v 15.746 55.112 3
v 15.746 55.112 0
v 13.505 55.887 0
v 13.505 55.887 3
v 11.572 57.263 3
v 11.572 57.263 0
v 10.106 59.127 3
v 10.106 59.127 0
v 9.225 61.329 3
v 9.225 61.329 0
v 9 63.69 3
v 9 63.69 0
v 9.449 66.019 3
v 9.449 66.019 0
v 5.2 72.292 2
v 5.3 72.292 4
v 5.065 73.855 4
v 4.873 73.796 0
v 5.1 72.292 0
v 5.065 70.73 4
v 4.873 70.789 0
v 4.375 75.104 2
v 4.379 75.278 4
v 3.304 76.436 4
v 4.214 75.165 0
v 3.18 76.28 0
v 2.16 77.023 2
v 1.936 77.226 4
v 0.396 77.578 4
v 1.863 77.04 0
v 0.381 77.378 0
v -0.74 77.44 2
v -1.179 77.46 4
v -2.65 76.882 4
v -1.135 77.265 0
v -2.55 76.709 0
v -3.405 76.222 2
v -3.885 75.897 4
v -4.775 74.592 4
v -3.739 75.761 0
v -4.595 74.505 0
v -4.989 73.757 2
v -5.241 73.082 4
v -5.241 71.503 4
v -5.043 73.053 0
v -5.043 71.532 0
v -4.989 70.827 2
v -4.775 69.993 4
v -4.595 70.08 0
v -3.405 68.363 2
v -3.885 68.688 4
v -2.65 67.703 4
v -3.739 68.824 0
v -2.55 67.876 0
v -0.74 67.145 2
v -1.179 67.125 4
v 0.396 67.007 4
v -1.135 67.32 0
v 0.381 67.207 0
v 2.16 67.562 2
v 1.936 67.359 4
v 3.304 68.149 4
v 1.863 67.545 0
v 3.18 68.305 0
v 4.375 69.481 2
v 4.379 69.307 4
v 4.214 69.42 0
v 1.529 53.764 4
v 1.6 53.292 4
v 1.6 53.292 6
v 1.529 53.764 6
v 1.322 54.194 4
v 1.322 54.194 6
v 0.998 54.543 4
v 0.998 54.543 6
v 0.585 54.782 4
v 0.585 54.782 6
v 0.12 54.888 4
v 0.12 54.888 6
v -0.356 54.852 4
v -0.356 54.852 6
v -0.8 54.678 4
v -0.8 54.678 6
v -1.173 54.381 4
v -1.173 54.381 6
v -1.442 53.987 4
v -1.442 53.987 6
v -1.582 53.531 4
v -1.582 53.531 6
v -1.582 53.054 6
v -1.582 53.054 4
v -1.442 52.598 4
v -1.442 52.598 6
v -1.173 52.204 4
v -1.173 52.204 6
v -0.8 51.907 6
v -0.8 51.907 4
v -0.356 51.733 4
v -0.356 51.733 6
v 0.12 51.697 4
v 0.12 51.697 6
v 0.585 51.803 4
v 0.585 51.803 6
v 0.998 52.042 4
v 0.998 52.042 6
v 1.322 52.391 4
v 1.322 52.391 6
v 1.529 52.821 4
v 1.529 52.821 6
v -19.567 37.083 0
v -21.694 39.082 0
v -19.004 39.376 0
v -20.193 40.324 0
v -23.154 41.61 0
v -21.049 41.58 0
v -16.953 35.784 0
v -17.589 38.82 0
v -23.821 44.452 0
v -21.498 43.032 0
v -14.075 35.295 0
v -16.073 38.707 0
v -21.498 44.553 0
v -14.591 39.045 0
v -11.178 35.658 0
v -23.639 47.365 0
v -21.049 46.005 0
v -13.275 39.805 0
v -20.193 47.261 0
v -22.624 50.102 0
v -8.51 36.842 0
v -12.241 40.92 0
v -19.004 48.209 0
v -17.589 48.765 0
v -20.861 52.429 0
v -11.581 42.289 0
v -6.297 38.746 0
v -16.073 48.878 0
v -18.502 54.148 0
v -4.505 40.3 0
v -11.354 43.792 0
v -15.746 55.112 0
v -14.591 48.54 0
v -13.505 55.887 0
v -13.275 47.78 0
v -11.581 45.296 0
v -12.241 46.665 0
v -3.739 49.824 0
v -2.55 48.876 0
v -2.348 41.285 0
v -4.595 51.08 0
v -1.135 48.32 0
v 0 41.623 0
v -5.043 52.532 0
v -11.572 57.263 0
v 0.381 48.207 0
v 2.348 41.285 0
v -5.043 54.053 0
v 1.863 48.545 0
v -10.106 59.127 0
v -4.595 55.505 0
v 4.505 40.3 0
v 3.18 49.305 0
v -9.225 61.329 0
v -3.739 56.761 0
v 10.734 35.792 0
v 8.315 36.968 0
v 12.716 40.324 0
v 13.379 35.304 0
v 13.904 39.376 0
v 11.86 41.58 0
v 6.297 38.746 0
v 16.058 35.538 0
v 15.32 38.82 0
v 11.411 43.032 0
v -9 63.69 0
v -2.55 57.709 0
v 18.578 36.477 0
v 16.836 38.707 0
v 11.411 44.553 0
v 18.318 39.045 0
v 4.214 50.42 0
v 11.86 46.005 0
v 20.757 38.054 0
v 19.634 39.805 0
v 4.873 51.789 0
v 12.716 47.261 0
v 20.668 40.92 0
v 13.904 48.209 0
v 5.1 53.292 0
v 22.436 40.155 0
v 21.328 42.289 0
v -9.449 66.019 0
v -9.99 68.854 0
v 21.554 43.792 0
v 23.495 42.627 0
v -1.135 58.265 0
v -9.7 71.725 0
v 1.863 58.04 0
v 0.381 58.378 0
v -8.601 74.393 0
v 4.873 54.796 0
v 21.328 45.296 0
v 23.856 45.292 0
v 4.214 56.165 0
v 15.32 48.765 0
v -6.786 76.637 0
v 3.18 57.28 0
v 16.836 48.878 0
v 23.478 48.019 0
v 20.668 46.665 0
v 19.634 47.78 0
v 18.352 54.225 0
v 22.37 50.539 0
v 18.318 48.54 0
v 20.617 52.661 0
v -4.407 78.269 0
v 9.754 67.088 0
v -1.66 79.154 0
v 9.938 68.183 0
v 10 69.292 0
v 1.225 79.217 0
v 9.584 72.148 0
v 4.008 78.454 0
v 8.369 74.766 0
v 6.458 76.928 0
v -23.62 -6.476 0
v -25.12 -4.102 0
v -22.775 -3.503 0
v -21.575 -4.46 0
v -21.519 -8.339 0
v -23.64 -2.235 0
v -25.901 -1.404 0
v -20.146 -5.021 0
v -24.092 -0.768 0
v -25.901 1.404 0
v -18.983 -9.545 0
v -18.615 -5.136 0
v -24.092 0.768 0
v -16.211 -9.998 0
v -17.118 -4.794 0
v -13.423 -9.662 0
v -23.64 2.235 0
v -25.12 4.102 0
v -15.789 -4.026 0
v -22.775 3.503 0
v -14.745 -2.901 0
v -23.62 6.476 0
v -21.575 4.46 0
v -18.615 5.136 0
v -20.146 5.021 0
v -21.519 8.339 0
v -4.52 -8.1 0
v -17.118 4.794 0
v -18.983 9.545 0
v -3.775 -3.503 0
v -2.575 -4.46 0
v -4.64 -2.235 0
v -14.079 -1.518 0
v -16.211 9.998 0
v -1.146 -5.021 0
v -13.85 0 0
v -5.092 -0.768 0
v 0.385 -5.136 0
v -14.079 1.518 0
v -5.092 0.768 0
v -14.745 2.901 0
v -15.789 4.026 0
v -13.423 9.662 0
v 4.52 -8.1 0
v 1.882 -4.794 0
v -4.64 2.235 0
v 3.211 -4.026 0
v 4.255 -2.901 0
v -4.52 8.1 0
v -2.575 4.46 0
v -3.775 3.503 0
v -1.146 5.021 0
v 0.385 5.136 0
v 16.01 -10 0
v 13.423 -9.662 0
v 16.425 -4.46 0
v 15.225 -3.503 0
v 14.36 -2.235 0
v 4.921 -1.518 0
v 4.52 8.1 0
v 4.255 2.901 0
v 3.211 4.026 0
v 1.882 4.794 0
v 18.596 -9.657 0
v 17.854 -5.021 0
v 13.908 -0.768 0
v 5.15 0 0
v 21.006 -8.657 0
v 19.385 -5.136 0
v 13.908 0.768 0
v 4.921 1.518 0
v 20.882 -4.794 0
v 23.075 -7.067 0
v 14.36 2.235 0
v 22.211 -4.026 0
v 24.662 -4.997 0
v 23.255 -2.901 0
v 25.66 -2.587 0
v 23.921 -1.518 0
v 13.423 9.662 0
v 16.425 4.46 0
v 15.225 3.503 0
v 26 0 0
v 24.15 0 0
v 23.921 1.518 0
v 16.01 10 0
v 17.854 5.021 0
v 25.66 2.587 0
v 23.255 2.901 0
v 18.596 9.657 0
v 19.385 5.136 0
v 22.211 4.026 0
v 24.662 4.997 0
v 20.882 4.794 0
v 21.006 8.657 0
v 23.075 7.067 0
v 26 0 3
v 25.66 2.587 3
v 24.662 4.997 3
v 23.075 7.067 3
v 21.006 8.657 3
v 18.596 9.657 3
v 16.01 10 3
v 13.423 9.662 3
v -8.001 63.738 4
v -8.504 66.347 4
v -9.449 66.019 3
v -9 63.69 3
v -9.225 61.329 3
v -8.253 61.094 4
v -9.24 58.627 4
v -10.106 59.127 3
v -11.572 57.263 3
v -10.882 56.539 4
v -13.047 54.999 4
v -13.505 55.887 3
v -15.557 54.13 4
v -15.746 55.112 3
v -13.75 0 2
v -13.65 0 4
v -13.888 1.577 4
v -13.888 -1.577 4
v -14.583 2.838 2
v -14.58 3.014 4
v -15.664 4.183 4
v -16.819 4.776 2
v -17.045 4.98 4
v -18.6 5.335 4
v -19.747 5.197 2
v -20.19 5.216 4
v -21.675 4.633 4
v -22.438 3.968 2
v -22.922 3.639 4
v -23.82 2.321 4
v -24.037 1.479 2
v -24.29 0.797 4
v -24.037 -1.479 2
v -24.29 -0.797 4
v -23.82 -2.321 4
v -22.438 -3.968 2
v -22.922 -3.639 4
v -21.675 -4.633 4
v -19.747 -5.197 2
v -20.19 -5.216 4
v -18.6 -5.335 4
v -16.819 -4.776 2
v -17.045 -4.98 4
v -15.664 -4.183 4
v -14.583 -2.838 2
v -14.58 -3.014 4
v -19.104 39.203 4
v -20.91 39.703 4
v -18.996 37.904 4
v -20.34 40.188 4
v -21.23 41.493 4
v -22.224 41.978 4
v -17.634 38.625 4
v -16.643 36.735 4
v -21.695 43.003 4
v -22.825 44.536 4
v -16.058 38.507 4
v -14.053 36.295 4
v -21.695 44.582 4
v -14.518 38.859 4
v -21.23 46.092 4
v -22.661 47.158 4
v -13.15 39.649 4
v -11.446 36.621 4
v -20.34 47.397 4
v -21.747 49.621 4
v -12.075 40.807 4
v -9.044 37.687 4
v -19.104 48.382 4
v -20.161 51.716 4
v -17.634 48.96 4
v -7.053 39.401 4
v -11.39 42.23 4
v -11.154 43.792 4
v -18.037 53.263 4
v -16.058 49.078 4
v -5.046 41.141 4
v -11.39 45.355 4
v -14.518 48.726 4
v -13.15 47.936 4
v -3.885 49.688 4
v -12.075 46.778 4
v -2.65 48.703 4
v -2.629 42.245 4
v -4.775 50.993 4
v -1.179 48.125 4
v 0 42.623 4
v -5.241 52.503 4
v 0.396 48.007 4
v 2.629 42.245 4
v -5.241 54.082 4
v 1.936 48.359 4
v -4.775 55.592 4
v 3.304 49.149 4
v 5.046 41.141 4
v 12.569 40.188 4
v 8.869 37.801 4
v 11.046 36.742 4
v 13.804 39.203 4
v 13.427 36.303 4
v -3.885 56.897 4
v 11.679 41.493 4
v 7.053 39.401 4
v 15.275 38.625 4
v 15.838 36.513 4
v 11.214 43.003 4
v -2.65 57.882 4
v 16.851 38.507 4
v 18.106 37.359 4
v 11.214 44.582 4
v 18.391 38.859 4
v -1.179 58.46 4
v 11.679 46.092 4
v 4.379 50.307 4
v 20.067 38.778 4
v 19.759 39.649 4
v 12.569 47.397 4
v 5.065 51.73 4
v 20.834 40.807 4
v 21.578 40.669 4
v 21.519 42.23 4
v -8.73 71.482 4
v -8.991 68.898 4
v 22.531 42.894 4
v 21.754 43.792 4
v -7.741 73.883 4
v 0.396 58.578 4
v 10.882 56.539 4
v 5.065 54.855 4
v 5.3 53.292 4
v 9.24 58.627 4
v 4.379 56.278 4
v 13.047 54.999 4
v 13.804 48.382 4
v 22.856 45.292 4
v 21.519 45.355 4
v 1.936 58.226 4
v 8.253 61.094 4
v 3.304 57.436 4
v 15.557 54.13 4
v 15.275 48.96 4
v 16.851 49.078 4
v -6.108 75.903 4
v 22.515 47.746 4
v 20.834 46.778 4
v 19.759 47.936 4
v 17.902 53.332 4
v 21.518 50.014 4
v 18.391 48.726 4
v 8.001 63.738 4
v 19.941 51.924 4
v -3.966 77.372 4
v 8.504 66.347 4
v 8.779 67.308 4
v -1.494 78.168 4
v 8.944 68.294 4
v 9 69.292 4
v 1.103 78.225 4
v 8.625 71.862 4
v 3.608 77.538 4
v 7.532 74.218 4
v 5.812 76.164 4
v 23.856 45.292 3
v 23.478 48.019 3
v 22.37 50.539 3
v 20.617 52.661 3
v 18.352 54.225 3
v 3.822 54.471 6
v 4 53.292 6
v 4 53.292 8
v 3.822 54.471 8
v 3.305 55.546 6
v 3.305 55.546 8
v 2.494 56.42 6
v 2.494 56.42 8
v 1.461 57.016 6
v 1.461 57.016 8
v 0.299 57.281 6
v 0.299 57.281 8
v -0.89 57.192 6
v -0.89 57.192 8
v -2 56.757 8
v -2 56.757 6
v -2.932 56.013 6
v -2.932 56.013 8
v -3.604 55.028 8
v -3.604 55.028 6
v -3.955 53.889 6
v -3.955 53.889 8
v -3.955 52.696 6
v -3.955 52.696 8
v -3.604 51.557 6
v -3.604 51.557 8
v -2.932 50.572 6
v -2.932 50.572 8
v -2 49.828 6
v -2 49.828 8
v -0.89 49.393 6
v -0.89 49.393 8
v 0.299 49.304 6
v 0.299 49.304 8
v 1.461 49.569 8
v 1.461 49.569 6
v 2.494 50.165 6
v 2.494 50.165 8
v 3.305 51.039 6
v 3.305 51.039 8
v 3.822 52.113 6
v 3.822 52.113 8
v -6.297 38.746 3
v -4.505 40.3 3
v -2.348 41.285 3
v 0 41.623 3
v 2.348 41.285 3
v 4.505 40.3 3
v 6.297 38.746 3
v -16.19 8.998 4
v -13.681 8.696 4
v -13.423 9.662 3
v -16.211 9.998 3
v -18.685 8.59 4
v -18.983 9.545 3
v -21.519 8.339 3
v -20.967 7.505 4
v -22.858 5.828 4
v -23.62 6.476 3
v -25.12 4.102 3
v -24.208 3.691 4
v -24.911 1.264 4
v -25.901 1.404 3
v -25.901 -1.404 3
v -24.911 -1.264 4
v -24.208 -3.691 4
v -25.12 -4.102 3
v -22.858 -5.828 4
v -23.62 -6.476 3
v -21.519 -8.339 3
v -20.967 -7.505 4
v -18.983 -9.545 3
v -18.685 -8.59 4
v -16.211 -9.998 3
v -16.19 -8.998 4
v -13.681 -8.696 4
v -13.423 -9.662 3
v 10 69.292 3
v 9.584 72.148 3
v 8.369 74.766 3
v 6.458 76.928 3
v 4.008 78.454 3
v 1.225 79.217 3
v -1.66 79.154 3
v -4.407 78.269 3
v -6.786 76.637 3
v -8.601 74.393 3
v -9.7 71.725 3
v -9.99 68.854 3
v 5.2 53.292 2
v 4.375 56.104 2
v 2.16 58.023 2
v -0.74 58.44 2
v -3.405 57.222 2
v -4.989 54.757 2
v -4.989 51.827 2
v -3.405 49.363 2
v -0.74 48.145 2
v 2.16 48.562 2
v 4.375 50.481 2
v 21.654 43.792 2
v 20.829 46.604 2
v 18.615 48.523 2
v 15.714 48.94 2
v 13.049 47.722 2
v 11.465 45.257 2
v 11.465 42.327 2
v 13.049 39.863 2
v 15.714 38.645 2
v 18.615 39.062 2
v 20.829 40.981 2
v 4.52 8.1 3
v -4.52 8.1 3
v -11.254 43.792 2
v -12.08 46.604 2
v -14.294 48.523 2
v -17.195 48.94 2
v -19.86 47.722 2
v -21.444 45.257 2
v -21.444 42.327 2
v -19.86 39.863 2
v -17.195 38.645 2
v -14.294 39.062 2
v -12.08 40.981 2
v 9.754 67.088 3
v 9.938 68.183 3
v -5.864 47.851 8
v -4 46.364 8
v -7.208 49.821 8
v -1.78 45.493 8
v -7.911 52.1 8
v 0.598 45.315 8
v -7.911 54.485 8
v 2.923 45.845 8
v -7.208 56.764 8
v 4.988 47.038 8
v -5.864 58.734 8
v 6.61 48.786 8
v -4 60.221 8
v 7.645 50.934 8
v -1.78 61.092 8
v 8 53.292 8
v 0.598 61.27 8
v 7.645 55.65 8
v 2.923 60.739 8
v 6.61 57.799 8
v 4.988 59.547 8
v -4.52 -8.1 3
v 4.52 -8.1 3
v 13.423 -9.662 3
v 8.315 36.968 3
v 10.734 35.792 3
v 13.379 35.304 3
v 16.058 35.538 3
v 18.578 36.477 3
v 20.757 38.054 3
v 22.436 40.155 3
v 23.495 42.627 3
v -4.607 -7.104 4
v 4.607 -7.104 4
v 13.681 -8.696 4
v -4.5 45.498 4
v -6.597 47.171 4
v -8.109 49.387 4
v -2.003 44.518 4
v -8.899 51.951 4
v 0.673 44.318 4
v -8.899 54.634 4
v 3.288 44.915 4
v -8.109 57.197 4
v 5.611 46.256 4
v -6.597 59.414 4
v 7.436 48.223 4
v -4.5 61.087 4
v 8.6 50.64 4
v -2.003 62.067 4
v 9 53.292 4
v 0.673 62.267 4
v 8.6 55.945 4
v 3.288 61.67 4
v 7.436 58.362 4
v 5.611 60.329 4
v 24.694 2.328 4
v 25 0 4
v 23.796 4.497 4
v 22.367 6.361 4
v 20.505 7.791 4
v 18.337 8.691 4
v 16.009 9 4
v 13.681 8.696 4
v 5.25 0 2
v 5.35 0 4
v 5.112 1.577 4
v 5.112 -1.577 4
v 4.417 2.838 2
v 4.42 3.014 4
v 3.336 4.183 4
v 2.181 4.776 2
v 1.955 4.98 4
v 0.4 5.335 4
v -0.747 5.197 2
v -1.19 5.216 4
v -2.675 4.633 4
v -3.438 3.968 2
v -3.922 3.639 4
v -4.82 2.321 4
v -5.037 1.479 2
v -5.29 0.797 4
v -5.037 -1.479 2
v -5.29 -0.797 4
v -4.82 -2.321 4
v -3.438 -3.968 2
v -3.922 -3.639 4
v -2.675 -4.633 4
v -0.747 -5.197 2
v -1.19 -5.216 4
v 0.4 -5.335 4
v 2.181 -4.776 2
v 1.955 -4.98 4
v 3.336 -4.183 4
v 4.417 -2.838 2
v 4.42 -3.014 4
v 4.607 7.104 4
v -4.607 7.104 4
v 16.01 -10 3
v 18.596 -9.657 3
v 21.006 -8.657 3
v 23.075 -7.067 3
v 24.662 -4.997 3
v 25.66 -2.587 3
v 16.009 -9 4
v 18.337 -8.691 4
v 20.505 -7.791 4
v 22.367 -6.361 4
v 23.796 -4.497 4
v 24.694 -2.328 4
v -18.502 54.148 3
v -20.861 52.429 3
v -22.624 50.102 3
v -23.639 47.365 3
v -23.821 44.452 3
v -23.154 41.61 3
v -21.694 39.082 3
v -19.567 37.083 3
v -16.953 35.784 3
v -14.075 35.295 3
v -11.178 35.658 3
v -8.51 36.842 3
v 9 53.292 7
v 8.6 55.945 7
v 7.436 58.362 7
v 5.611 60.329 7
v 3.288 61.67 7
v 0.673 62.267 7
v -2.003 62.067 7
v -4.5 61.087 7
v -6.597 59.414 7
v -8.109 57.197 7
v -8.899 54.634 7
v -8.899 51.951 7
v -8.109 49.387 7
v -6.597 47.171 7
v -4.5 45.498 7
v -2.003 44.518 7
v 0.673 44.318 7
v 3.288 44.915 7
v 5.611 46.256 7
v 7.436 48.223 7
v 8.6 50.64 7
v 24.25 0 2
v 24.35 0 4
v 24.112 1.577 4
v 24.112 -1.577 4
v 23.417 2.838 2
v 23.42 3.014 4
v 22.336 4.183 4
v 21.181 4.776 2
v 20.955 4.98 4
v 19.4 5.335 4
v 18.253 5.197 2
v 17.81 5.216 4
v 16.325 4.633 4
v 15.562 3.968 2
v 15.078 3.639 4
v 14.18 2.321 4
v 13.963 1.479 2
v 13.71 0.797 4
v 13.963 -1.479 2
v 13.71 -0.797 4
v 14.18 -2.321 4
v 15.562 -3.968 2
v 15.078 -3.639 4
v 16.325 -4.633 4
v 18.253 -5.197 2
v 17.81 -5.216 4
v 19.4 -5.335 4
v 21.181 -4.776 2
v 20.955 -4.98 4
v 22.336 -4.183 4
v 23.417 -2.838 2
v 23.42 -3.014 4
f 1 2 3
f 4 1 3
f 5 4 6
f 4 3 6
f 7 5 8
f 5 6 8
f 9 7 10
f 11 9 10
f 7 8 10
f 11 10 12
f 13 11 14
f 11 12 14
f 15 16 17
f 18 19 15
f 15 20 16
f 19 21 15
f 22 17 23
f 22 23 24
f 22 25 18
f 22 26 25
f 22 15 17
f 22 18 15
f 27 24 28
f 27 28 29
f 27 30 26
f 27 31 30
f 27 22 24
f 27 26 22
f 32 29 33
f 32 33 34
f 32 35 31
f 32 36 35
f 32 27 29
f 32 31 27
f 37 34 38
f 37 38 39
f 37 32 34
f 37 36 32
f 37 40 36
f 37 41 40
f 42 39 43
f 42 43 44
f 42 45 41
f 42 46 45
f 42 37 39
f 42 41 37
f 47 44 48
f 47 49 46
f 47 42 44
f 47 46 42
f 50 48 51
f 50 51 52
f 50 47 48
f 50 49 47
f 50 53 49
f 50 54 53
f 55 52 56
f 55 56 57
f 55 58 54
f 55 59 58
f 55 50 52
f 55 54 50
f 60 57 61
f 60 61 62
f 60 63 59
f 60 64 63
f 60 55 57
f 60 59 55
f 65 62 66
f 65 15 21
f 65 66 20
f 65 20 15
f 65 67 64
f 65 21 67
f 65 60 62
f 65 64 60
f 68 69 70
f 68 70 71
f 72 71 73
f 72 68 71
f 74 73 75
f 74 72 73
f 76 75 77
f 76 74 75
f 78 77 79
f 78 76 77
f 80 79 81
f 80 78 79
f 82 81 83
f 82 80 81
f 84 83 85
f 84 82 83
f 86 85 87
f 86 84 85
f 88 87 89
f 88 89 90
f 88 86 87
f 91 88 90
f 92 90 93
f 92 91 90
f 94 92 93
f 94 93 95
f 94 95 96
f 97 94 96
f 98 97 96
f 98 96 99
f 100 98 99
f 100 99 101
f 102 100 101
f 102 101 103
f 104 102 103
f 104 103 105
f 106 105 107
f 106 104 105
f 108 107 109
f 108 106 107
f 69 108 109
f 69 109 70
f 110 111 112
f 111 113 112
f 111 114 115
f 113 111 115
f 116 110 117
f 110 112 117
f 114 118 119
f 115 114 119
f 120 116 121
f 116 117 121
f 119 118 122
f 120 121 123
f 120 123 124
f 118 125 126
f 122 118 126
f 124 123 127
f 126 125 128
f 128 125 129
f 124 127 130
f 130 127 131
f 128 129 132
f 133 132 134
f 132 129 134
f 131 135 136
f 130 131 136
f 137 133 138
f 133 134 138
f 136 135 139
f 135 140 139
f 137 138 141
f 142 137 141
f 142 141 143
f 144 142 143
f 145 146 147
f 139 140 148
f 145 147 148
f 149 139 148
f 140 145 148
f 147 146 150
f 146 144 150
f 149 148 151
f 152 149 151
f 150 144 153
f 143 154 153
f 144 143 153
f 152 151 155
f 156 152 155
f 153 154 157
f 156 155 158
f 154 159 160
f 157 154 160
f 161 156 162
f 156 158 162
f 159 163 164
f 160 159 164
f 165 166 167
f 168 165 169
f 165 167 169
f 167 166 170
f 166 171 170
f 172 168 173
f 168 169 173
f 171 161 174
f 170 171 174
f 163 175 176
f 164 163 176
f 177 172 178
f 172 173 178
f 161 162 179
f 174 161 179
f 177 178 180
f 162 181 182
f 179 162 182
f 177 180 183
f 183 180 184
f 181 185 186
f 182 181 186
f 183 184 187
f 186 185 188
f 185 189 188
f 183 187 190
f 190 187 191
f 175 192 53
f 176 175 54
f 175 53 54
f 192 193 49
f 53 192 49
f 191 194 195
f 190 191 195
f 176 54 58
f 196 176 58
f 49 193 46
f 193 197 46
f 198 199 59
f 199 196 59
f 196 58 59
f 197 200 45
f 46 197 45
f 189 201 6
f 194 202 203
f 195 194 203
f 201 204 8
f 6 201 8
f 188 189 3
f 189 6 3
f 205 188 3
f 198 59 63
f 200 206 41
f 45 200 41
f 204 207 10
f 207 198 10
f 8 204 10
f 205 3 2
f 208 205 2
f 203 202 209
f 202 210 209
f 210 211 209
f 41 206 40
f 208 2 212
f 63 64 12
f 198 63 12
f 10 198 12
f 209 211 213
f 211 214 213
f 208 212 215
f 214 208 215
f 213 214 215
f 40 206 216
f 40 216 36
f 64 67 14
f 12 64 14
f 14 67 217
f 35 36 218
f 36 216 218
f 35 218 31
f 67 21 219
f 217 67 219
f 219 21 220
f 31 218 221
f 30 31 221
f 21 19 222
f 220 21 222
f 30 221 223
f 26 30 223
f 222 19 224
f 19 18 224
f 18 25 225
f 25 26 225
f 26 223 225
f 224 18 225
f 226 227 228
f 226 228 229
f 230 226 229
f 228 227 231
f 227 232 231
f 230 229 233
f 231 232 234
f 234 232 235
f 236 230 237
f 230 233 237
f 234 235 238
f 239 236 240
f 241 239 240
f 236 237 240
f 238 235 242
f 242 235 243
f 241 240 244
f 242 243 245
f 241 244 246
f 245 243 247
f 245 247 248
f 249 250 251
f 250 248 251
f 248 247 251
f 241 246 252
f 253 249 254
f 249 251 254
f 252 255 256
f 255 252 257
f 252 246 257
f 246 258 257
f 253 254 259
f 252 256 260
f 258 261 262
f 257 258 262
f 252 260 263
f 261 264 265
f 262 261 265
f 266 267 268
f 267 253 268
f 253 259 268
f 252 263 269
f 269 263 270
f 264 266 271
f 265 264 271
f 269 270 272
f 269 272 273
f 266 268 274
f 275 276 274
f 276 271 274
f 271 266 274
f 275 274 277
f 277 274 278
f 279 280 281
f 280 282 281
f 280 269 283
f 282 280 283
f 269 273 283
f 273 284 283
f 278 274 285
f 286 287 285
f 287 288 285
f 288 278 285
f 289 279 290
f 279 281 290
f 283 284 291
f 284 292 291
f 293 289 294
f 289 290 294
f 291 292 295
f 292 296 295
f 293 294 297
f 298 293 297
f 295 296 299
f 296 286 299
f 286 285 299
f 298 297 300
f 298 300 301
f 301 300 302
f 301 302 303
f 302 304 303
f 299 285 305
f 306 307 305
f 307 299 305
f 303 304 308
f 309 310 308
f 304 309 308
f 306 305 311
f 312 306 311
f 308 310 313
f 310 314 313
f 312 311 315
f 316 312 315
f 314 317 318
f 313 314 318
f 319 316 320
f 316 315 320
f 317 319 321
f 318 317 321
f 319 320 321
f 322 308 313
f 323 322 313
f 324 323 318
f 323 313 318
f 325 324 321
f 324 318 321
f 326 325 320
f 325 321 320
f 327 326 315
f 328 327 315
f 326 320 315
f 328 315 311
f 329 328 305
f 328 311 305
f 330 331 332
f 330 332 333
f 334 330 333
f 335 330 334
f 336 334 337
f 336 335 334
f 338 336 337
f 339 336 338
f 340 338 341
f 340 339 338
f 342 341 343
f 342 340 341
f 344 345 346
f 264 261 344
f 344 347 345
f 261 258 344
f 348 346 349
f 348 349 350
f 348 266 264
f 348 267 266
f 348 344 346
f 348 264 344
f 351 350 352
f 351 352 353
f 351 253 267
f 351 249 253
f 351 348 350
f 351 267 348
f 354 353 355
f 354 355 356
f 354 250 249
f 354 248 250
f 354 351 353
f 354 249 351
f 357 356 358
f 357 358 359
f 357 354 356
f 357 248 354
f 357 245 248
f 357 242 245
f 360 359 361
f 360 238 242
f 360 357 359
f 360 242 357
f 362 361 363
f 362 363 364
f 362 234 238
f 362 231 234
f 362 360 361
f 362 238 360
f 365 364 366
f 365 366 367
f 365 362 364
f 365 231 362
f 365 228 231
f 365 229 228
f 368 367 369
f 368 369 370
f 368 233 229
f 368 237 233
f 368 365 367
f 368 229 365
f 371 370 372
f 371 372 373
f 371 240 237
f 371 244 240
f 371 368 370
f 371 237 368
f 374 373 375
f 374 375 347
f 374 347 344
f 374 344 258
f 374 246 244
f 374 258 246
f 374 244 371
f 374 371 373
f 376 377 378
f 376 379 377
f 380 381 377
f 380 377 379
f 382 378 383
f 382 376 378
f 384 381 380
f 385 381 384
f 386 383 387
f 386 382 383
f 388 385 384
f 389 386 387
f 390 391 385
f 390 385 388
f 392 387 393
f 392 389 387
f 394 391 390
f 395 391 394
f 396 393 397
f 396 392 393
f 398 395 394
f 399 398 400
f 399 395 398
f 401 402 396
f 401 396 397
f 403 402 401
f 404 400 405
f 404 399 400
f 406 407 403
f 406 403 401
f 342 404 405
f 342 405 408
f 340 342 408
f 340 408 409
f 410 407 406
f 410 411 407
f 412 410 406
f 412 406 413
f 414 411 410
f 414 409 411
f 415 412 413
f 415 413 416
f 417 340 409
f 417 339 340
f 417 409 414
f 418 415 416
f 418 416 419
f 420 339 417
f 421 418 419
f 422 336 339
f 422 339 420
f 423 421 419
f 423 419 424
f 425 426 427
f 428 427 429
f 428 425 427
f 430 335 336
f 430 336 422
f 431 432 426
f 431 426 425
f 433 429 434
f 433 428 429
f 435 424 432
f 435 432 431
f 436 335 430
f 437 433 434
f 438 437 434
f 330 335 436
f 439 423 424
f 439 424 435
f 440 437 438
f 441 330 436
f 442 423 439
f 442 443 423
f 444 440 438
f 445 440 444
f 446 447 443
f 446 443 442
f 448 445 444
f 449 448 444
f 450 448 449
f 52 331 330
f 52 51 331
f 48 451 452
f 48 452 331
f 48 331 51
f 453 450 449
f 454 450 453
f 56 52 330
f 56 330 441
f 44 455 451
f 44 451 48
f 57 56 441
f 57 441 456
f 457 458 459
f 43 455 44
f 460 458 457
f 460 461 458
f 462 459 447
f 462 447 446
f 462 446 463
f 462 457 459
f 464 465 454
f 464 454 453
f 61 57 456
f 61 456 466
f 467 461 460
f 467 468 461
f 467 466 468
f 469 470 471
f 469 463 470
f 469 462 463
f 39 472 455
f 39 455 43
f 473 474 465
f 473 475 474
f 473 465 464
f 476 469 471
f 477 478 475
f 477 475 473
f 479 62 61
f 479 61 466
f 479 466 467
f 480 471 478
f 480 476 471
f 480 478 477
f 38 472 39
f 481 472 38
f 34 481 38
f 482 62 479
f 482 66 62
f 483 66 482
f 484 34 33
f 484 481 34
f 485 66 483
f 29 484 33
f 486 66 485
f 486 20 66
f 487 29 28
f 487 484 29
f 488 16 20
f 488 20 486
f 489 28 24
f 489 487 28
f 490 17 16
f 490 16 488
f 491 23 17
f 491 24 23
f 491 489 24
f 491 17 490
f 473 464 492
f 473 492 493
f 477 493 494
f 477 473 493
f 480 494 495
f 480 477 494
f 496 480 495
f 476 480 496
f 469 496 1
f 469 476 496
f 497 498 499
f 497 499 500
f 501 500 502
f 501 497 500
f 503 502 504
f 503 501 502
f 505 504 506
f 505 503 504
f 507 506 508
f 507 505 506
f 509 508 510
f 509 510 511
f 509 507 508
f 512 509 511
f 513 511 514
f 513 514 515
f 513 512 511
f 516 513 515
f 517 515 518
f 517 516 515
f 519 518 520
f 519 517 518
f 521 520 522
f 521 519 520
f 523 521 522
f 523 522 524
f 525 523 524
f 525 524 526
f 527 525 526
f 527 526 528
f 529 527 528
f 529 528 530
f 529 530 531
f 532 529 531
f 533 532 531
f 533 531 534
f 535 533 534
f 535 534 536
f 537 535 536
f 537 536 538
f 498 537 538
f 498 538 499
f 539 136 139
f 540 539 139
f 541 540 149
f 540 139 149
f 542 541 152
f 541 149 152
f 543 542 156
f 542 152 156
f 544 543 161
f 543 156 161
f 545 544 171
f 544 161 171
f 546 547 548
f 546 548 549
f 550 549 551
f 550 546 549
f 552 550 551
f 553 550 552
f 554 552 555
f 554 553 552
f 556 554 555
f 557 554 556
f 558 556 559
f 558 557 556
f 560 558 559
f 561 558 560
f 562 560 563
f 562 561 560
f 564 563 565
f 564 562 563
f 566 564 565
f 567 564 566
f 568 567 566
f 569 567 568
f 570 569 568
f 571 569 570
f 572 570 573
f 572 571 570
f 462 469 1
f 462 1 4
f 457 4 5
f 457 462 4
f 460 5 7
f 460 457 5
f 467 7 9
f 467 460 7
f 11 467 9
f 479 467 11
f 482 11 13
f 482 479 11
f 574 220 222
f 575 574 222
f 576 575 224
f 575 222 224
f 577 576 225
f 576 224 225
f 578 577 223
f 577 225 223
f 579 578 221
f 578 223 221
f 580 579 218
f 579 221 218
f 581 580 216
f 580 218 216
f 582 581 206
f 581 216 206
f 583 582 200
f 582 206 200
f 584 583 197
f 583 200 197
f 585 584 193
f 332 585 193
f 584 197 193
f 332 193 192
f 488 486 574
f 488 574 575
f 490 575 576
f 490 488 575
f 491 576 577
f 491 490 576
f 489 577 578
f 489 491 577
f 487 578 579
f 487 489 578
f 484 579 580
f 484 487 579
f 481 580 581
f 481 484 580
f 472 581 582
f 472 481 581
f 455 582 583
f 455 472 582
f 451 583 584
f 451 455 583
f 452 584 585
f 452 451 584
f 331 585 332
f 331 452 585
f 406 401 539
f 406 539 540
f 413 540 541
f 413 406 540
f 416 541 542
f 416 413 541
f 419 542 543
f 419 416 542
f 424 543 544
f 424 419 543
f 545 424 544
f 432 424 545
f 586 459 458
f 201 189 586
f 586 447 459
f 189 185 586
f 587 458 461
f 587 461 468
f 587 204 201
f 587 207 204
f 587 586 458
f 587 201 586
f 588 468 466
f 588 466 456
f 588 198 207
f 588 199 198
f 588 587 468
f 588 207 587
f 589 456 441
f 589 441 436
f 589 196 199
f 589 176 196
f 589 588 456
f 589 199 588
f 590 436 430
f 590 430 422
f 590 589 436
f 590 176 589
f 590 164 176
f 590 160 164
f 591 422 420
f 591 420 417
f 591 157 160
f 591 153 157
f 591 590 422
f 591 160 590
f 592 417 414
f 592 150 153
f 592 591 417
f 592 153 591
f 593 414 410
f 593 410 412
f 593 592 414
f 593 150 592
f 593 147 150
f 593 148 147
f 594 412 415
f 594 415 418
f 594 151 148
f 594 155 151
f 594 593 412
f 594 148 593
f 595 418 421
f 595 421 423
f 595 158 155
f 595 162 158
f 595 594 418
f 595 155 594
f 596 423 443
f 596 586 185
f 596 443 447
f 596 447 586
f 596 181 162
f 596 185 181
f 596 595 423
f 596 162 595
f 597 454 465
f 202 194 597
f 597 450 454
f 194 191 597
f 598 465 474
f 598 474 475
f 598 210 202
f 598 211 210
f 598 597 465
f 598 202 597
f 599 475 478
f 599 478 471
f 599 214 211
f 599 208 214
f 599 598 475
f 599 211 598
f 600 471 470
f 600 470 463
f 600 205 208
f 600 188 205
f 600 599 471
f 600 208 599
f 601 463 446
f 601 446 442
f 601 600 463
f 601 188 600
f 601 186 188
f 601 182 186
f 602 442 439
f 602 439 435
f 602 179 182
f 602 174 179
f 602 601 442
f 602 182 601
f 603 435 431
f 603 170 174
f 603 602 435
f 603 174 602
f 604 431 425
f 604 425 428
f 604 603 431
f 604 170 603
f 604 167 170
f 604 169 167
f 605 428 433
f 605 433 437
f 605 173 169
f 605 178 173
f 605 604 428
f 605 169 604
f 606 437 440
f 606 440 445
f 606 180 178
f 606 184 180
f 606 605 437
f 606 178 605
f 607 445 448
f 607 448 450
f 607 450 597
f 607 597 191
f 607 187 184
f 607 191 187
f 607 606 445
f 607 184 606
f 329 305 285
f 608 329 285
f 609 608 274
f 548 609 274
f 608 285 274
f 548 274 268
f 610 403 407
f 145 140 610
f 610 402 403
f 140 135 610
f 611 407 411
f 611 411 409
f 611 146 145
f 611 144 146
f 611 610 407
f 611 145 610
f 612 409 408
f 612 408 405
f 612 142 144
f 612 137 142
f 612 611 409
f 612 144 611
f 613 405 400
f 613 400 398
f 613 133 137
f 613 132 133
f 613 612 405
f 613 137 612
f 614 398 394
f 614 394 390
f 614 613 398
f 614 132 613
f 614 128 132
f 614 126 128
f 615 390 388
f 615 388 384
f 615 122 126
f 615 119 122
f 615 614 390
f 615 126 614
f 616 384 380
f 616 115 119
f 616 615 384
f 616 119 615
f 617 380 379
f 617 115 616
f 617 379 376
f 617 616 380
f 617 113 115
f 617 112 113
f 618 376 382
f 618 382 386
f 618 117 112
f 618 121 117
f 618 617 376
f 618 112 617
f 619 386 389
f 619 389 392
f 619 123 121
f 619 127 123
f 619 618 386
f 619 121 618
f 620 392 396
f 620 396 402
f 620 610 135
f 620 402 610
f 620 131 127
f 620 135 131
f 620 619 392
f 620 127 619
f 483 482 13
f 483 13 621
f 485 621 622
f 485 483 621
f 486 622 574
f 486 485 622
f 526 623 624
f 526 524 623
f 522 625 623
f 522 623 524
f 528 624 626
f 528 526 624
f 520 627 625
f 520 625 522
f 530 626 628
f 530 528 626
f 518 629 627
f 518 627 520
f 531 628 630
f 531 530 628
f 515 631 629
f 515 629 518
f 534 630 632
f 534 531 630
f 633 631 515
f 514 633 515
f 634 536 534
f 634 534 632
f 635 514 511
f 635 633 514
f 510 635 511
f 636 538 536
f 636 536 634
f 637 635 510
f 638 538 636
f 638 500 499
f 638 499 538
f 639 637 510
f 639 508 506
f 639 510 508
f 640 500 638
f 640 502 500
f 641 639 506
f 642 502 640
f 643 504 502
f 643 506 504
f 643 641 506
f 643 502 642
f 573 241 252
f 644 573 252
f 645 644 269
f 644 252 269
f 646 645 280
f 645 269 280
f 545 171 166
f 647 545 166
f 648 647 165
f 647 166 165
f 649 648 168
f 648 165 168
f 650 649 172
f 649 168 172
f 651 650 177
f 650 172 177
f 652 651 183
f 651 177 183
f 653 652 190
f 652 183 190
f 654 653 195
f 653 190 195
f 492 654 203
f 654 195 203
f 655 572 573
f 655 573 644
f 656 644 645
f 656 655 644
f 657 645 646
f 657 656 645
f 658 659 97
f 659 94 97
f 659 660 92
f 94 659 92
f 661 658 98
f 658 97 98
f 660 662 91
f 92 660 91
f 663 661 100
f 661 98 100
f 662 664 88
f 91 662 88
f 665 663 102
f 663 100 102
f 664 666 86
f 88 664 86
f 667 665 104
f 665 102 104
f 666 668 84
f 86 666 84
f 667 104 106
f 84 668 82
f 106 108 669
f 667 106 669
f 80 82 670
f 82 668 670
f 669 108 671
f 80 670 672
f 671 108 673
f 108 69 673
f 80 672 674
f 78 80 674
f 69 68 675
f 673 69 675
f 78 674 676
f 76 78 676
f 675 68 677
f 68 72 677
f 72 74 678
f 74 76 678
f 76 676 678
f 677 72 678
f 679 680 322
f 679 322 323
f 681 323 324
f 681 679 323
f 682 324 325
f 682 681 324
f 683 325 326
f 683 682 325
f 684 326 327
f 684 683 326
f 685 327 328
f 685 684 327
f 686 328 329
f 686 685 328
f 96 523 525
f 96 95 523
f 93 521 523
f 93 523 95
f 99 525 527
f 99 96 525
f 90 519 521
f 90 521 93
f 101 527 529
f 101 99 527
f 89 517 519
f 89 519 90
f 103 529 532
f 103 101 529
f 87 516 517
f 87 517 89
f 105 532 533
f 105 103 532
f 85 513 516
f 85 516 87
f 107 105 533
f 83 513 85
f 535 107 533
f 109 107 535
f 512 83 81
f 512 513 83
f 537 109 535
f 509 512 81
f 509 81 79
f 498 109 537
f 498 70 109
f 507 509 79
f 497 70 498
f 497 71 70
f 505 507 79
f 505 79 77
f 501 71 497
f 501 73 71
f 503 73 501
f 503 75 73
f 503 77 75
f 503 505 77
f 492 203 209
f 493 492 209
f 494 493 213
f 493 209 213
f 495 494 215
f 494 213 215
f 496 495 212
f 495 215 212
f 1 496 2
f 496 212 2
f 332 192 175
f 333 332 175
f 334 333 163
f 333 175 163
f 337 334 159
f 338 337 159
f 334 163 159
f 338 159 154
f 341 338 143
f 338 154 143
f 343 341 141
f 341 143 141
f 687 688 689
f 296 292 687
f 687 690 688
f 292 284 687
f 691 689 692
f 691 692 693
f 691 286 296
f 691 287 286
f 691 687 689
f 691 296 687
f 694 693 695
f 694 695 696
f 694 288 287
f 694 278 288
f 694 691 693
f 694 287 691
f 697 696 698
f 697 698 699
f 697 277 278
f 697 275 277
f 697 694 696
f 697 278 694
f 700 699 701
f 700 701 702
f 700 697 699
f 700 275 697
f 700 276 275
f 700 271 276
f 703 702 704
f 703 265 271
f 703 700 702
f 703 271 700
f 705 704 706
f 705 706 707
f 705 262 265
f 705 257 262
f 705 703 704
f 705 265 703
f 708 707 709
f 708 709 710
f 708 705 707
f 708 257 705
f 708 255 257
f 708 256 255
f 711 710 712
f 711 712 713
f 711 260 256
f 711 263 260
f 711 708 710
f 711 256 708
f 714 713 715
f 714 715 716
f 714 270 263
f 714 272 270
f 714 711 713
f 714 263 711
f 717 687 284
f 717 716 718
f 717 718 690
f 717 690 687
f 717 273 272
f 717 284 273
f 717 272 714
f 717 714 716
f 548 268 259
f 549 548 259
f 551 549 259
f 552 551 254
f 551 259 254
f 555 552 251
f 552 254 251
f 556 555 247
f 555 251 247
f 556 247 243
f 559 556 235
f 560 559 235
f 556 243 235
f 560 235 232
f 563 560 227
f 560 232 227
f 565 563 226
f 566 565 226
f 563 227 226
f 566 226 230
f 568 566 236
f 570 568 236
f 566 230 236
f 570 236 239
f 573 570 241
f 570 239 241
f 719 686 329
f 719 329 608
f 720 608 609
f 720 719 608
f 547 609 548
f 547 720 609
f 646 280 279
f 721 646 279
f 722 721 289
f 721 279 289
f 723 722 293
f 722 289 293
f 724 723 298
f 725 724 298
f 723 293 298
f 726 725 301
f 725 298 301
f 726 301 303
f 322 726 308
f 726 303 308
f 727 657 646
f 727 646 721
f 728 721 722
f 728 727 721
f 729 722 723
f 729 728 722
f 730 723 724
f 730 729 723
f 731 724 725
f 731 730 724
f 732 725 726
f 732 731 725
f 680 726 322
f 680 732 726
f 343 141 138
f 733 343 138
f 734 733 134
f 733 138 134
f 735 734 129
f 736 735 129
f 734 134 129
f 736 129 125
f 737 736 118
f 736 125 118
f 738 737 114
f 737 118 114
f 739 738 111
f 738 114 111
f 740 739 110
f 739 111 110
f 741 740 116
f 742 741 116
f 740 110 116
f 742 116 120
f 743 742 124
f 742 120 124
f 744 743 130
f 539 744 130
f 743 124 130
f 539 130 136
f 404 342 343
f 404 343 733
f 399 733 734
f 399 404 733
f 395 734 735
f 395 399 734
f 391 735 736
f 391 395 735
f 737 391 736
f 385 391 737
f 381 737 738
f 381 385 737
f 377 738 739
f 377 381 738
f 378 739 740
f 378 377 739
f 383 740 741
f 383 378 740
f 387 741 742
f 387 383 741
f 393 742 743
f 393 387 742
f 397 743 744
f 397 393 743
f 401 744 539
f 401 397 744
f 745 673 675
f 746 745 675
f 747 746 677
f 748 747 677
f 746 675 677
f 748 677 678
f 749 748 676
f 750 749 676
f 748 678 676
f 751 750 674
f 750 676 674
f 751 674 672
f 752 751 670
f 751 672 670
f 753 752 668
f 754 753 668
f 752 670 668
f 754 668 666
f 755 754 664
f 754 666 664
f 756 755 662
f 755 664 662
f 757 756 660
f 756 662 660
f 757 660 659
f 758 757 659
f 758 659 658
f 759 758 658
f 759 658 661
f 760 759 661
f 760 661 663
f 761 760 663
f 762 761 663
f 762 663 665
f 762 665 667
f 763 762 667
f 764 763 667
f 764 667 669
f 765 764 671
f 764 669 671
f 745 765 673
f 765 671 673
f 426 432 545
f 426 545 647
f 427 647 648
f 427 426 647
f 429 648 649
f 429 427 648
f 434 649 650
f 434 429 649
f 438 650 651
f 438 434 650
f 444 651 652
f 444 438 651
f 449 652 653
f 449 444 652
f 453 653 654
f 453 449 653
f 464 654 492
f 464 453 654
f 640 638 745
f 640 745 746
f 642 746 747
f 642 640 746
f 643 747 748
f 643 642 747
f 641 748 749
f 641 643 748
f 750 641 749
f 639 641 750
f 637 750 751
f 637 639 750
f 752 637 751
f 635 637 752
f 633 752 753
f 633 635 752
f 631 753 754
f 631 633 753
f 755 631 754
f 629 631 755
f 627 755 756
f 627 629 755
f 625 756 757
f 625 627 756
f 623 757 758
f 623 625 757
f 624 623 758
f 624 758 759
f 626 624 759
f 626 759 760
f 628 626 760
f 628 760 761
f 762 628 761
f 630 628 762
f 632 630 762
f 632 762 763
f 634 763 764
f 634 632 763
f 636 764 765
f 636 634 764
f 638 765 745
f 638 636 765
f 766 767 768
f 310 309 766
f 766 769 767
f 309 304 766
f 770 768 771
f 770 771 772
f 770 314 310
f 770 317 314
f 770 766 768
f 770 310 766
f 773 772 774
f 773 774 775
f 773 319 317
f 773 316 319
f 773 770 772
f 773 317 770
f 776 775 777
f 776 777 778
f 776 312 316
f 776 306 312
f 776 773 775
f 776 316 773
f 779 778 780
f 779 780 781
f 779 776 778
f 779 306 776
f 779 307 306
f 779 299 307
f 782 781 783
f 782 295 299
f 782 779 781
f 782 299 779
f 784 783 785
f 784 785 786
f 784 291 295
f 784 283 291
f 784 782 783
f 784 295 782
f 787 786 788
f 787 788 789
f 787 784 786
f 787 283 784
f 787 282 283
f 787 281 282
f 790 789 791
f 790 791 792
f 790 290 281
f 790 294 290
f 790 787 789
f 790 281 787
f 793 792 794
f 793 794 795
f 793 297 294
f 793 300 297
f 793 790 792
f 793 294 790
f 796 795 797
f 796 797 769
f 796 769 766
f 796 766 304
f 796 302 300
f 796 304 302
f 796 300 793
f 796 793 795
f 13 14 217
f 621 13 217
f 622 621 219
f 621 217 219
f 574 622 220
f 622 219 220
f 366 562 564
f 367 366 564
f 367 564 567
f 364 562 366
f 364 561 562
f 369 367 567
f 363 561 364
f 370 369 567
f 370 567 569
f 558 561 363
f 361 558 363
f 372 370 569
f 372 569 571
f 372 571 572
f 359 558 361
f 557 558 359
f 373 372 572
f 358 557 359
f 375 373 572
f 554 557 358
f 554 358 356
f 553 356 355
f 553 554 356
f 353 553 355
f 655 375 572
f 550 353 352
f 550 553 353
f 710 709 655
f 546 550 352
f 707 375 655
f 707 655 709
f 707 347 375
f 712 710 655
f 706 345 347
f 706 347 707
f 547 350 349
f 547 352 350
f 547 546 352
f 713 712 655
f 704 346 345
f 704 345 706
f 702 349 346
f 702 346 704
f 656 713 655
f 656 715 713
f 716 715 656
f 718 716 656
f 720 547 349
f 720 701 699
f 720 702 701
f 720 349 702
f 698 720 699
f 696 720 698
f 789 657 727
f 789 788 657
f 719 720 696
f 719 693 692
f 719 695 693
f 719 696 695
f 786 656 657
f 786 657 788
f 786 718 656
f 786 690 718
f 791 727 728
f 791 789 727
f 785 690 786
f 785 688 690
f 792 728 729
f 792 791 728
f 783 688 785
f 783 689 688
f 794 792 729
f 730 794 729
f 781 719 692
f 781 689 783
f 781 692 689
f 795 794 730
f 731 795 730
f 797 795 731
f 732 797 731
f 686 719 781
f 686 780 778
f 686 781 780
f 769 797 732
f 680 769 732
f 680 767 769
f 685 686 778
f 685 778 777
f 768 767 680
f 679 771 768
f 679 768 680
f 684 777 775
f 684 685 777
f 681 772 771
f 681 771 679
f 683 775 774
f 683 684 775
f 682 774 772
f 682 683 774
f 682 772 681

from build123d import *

# Parameters (mm, degrees)
F0_R       = 5.15
F1_DEPTH   = 4
F2_SIZE    = 1
F3_R       = 5.1
F4_DEPTH   = 4
F5_SIZE    = 1
F6_SIZE2   = 3.99999
F6_SIZE    = 0.19999
F6_2_SIZE2 = 3.99999
F6_2_SIZE  = 0.19999
F7_R       = 9
F7_R_2     = 5.29999
F7_R_3     = 4
F8_DEPTH   = 4
F7_R_4     = 1.6
F9_DEPTH   = 2
F10_SIZE   = 1


# Not quite as in the source:
# - a fillet or chamfer is up to 0.001 mm smaller than in the source, because OpenCascade refuses the exact size
# - a feature names something its author has since deleted; it is built from what else it names


with BuildPart() as f1:
    # F0 (on Top) → F1 (new body)
    with BuildSketch(Plane.XY):
        with BuildLine():
            ThreePointArc((-13.4233737216, 9.6623494566), (-8.0701115145, 6.0923614968), (-6, 0))
            ThreePointArc((-6, 0), (-8.0701114601, -6.092361426), (-13.4233735489, -9.6623494106))
            ThreePointArc((-13.4233735489, -9.6623494106), (6.05e-08, -7.903301215), (13.4233736658, -9.6623494417))
            ThreePointArc((13.4233736658, -9.6623494417), (6, -6.16e-08), (13.4233735467, 9.66234941))
            ThreePointArc((13.4233735467, 9.66234941), (-9.05e-08, 7.903301215), (-13.4233737216, 9.6623494566))
        make_face()
        Circle(F0_R, mode=Mode.SUBTRACT)
        with BuildLine():
            ThreePointArc((-13.4233735489, -9.6623494106), (-8.0701114601, -6.092361426), (-6, 0))
            ThreePointArc((-6, 0), (-8.0701115145, 6.0923614968), (-13.4233737216, 9.6623494566))
            ThreePointArc((-13.4233737216, 9.6623494566), (-26, -8.94e-08), (-13.4233735489, -9.6623494106))
        make_face()
        with Locations((-19, 0)):
            Circle(F0_R, mode=Mode.SUBTRACT)
        with BuildLine():
            ThreePointArc((26, 0), (22.0923614251, 7.9298885406), (13.4233735467, 9.66234941))
            ThreePointArc((13.4233735467, 9.66234941), (6, -6.16e-08), (13.4233736658, -9.6623494417))
            ThreePointArc((13.4233736658, -9.6623494417), (22.0923614739, -7.929888503), (26, 0))
        make_face()
        with Locations((19, 0)):
            Circle(F0_R, mode=Mode.SUBTRACT)
    extrude(amount=F1_DEPTH)

    # F2
    f2_edges = [f1.edges().sort_by_distance(p)[0] for p in [
        (0, -7.903301, 4),
    ]]
    chamfer(f2_edges, length=F2_SIZE)

    # F6 (size 0.2 and 4 in the source; OpenCascade refuses exactly that, so slightly less here)
    f6_edges = [f1.edges().sort_by_distance(p)[0] for p in [
        (-24.15, 0, 4),
        (13.85, 0, 4),
        (-5.15, 0, 4),
    ]]
    f6_side = f1.faces().sort_by_distance((0, -6.371888, 4))[0]
    chamfer(f6_edges, length=F6_SIZE, length2=F6_SIZE2, reference=f6_side)


with BuildPart() as f4:
    # F3 (on Top) → F4 (new body)
    with BuildSketch(Plane.XY):
        with BuildLine():
            ThreePointArc((9.4491118238, 66.0191849315), (9.8613162975, 67.632802458), (10, 69.292453289))
            ThreePointArc((10, 69.292453289), (-1.6596509098, 79.1537695733), (-9.4491117716, 66.0191847805))
            ThreePointArc((-9.4491117716, 66.0191847805), (7.99e-08, 59.292453289), (9.4491118238, 66.0191849315))
        make_face()
        with Locations((0, 72.292453289)):
            Circle(F3_R, mode=Mode.SUBTRACT)
        with BuildLine():
            ThreePointArc((9.4491118238, 66.0191849315), (7.99e-08, 59.292453289), (-9.4491117716, 66.0191847805))
            ThreePointArc((-9.4491117716, 66.0191847805), (-10.1062544883, 59.1273014814), (-15.7462296119, 55.1122581983))
            ThreePointArc((-15.7462296119, 55.1122581983), (-7.4884488411, 53.0027785582), (-3.8564064606, 45.292453289))
            ThreePointArc((-3.8564064606, 45.292453289), (-4.4864305642, 41.7990950622), (-6.2971168007, 38.7459168125))
            ThreePointArc((-6.2971168007, 38.7459168125), (1.374e-07, 41.6227560689), (6.2971169806, 38.7459166047))
            ThreePointArc((6.2971169806, 38.7459166047), (5.1961526478, 50.2924536788), (15.74622968, 55.1122581852))
            ThreePointArc((15.74622968, 55.1122581852), (10.1062544657, 59.1273015205), (9.4491118238, 66.0191849315))
        make_face()
        with Locations((0, 53.292453289)):
            Circle(F3_R, mode=Mode.SUBTRACT)
        with BuildLine():
            ThreePointArc((23.8564064606, 45.292453289), (21.5667317518, 51.6604108818), (15.74622968, 55.1122581852))
            ThreePointArc((15.74622968, 55.1122581852), (5.1961526478, 50.2924536788), (6.2971169806, 38.7459166047))
            ThreePointArc((6.2971169806, 38.7459166047), (17.3497648161, 35.9224774406), (23.8564064606, 45.292453289))
        make_face()
        with Locations((16.4544826719, 43.792453289)):
            Circle(F3_R, mode=Mode.SUBTRACT)
        with BuildLine():
            ThreePointArc((-3.8564064606, 45.292453289), (-7.4884488411, 53.0027785582), (-15.7462296119, 55.1122581983))
            ThreePointArc((-15.7462296119, 55.1122581983), (-22.516660222, 40.2924528103), (-6.2971168007, 38.7459168125))
            ThreePointArc((-6.2971168007, 38.7459168125), (-4.4864305642, 41.7990950622), (-3.8564064606, 45.292453289))
        make_face()
        with Locations((-16.4544826719, 43.792453289)):
            Circle(F3_R, mode=Mode.SUBTRACT)
    extrude(amount=F4_DEPTH)

    # F5
    f5_edges = [f4.edges().sort_by_distance(p)[0] for p in [
        (-22.51666, 40.292453, 4),
    ]]
    chamfer(f5_edges, length=F5_SIZE)

    # F6#2 (size 0.2 and 4 in the source; OpenCascade refuses exactly that, so slightly less here)
    f6_2_edges = [f4.edges().sort_by_distance(p)[0] for p in [
        (-21.554483, 43.792453, 4),
        (-5.1, 53.292453, 4),
        (-5.1, 72.292453, 4),
        (11.354483, 43.792453, 4),
    ]]
    f6_2_side = f4.faces().sort_by_distance((-21.113025, 41.102842, 4))[0]
    chamfer(f6_2_edges, length=F6_2_SIZE, length2=F6_2_SIZE2, reference=f6_2_side)


with BuildPart() as f8:
    # F7 (on face) → F8 (new body)
    with BuildSketch(Plane.XY.offset(4)):
        with Locations((0, 53.292453289)):
            Circle(F7_R)
        with Locations((0, 53.292453289)):
            Circle(F7_R_2, mode=Mode.SUBTRACT)
        with Locations((0, 53.292453289)):
            Circle(F7_R_2)
        with Locations((0, 53.292453289)):
            Circle(F7_R_3, mode=Mode.SUBTRACT)
    extrude(amount=F8_DEPTH)

    # F7 (on face) → F9 (join)
    with BuildSketch(Plane.XY.offset(4)):
        with Locations((0, 53.292453289)):
            Circle(F7_R_3)
        with Locations((0, 53.292453289)):
            Circle(F7_R_4, mode=Mode.SUBTRACT)
    extrude(amount=F9_DEPTH)

    # F10
    f10_edges = [f8.edges().sort_by_distance(p)[0] for p in [
        (-9, 53.292453, 8),
    ]]
    chamfer(f10_edges, length=F10_SIZE)


solid = Compound([f1.part, f4.part, f8.part])
